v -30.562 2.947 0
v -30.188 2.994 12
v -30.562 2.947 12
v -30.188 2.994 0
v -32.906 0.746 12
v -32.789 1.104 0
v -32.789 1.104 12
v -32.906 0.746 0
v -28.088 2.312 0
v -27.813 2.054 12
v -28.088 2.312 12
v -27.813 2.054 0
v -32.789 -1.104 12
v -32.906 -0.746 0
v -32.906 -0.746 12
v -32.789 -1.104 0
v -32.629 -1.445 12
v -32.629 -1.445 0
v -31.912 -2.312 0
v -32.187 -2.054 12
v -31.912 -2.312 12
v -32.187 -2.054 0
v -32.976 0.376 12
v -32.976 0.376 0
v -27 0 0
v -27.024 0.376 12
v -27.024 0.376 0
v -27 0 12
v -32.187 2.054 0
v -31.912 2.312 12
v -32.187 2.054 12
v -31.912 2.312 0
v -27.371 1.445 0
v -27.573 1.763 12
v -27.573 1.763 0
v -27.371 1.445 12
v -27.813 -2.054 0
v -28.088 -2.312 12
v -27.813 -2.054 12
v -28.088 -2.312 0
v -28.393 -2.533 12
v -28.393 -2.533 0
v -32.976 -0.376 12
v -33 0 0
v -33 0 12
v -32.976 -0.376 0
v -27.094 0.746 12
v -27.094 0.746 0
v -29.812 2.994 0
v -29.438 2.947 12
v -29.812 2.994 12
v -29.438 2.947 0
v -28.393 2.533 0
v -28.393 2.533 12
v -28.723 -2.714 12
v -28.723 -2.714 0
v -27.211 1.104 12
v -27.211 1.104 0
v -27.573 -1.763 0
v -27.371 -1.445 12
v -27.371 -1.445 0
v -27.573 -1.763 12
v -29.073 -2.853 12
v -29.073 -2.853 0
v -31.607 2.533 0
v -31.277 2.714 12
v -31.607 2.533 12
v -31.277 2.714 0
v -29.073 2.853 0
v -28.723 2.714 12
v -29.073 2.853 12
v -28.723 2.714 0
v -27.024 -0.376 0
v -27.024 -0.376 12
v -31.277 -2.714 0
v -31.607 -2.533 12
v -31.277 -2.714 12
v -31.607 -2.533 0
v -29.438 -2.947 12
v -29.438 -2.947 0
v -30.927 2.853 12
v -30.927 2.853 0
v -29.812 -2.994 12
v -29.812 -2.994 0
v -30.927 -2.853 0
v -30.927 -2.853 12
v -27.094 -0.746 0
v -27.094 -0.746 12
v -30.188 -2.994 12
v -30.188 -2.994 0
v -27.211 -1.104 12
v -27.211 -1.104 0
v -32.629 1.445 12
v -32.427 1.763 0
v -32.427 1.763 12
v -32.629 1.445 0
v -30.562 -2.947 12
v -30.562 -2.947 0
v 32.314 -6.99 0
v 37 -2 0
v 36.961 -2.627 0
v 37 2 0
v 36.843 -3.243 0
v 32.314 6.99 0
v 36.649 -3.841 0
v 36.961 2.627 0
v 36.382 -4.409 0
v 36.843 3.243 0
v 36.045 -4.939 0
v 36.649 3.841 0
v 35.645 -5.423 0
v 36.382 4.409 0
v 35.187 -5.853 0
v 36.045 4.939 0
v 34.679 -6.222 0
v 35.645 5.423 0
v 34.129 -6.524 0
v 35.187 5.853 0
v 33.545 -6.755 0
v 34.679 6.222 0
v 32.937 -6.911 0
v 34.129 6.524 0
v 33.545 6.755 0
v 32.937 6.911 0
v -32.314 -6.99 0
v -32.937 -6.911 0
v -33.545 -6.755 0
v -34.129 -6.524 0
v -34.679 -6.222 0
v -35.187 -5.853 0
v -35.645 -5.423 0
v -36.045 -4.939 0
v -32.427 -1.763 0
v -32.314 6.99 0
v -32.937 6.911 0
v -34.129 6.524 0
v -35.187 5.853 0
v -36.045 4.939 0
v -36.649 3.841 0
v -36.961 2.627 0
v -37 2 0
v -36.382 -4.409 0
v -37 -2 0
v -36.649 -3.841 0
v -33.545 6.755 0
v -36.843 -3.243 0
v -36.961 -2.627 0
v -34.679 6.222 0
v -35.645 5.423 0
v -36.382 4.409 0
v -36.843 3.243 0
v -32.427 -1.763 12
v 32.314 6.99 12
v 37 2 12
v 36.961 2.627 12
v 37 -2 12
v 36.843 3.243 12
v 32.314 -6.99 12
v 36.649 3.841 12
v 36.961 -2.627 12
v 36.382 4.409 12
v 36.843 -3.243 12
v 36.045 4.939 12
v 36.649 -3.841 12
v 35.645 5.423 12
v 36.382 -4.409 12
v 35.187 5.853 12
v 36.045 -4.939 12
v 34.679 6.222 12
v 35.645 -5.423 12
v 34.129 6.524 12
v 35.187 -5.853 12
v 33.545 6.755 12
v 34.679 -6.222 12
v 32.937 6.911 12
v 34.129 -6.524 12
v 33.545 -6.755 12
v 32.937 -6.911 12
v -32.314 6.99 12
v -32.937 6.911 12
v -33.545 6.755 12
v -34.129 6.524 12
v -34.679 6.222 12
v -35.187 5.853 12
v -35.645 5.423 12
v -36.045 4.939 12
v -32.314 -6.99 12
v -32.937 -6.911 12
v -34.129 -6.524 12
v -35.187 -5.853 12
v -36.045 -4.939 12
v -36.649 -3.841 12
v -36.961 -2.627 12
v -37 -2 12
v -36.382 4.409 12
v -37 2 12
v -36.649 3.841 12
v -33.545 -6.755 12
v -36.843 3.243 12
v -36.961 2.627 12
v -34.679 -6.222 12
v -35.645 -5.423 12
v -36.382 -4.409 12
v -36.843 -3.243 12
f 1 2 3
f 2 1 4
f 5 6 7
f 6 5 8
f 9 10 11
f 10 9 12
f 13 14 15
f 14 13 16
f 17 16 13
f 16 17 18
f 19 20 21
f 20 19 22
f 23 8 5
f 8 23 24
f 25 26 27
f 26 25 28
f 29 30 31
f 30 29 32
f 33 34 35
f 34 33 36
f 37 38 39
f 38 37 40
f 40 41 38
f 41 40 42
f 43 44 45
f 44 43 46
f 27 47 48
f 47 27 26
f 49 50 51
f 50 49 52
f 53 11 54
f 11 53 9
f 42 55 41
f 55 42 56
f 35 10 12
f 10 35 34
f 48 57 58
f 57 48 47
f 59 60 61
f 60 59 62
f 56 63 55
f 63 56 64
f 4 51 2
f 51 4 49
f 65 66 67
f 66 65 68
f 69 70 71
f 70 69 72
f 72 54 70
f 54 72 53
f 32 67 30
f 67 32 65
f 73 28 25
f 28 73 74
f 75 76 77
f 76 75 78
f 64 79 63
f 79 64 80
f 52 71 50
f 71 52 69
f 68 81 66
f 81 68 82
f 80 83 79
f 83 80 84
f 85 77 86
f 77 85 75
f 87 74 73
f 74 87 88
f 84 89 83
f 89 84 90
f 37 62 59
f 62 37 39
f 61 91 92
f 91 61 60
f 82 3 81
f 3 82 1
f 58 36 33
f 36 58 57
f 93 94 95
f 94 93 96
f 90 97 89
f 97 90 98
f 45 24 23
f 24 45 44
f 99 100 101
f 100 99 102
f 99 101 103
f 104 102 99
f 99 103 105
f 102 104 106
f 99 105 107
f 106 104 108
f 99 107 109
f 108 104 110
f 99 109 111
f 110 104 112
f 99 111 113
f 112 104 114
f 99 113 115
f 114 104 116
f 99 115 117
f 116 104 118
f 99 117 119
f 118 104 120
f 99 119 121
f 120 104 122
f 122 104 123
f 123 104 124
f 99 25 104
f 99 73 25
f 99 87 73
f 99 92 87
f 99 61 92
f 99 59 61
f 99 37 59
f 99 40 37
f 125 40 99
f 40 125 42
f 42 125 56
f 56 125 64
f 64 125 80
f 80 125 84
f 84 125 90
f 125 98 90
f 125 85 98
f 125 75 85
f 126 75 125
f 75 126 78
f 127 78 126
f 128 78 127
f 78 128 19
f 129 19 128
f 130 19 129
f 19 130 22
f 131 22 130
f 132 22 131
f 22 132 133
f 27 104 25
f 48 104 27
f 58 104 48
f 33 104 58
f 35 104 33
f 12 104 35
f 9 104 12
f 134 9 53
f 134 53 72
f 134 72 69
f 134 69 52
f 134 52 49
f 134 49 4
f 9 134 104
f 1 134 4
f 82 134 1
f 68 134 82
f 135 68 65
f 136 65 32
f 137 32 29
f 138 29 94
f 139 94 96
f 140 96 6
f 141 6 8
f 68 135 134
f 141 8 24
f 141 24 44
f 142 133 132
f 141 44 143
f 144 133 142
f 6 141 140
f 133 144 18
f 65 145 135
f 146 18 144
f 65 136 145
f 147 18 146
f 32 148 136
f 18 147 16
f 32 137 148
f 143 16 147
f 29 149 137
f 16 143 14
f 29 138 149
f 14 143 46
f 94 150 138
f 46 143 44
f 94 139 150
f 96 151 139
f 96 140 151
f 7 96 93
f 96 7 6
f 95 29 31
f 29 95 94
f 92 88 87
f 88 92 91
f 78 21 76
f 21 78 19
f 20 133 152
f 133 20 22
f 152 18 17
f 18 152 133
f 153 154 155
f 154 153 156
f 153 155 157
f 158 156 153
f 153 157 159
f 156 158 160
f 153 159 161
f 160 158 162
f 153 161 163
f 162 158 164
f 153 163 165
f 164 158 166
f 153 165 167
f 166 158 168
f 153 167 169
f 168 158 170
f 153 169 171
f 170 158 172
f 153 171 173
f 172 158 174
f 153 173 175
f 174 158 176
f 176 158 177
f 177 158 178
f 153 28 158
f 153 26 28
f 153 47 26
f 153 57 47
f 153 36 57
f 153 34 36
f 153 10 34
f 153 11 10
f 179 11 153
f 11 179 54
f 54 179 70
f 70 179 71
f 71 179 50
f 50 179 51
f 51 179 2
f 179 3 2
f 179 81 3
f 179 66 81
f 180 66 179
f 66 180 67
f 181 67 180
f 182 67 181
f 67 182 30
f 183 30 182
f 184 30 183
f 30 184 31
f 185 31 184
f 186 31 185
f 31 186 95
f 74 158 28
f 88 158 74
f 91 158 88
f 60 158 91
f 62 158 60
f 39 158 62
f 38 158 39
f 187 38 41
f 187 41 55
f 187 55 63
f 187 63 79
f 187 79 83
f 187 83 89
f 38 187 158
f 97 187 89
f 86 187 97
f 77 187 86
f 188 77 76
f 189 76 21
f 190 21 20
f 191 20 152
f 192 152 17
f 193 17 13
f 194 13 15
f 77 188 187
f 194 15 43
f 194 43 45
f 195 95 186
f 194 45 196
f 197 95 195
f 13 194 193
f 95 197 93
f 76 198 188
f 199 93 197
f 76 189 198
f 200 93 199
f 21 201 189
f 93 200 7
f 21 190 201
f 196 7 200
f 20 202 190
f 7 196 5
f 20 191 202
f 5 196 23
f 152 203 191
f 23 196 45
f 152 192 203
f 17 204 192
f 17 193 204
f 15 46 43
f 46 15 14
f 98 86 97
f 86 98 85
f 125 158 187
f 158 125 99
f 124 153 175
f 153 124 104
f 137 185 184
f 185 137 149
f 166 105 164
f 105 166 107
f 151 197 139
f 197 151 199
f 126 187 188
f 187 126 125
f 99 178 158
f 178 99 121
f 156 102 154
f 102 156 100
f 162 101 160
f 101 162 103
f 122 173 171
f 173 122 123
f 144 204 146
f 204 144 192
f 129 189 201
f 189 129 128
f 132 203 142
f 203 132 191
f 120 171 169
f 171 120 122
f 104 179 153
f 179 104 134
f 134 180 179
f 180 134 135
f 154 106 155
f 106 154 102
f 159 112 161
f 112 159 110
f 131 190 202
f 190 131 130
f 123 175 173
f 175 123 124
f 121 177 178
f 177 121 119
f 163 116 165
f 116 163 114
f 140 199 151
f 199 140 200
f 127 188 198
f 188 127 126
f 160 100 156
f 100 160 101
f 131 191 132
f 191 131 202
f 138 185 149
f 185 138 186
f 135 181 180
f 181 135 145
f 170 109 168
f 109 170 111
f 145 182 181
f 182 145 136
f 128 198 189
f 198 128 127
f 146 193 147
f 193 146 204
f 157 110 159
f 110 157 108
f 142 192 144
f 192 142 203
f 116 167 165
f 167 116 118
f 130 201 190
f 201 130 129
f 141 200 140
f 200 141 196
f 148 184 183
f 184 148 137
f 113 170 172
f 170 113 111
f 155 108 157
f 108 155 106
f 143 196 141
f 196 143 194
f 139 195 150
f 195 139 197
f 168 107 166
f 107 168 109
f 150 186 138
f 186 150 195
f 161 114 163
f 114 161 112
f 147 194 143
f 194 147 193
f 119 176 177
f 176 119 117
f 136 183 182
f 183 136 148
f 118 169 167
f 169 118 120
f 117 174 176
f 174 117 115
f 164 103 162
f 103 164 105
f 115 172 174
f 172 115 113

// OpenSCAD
$fn = 50;


difference() {
	union() {
		hull() {
			translate(v = [-32.0000000000, 2.0000000000, 0]) {
				cylinder(h = 12, r = 5);
			}
			translate(v = [32.0000000000, 2.0000000000, 0]) {
				cylinder(h = 12, r = 5);
			}
			translate(v = [-32.0000000000, -2.0000000000, 0]) {
				cylinder(h = 12, r = 5);
			}
			translate(v = [32.0000000000, -2.0000000000, 0]) {
				cylinder(h = 12, r = 5);
			}
		}
	}
	union() {
		translate(v = [-30.0000000000, 0.0000000000, 0]) {
			cylinder(h = 12, r = 3.0000000000);
		}
		translate(v = [-30.0000000000, 0.0000000000, 0]) {
			cylinder(h = 12, r = 1.5000000000);
		}
		translate(v = [-30.0000000000, 0.0000000000, 0]) {
			cylinder(h = 12, r = 1.5000000000);
		}
		translate(v = [-30.0000000000, 0.0000000000, 0]) {
			cylinder(h = 12, r = 1.5000000000);
		}
	}
}
